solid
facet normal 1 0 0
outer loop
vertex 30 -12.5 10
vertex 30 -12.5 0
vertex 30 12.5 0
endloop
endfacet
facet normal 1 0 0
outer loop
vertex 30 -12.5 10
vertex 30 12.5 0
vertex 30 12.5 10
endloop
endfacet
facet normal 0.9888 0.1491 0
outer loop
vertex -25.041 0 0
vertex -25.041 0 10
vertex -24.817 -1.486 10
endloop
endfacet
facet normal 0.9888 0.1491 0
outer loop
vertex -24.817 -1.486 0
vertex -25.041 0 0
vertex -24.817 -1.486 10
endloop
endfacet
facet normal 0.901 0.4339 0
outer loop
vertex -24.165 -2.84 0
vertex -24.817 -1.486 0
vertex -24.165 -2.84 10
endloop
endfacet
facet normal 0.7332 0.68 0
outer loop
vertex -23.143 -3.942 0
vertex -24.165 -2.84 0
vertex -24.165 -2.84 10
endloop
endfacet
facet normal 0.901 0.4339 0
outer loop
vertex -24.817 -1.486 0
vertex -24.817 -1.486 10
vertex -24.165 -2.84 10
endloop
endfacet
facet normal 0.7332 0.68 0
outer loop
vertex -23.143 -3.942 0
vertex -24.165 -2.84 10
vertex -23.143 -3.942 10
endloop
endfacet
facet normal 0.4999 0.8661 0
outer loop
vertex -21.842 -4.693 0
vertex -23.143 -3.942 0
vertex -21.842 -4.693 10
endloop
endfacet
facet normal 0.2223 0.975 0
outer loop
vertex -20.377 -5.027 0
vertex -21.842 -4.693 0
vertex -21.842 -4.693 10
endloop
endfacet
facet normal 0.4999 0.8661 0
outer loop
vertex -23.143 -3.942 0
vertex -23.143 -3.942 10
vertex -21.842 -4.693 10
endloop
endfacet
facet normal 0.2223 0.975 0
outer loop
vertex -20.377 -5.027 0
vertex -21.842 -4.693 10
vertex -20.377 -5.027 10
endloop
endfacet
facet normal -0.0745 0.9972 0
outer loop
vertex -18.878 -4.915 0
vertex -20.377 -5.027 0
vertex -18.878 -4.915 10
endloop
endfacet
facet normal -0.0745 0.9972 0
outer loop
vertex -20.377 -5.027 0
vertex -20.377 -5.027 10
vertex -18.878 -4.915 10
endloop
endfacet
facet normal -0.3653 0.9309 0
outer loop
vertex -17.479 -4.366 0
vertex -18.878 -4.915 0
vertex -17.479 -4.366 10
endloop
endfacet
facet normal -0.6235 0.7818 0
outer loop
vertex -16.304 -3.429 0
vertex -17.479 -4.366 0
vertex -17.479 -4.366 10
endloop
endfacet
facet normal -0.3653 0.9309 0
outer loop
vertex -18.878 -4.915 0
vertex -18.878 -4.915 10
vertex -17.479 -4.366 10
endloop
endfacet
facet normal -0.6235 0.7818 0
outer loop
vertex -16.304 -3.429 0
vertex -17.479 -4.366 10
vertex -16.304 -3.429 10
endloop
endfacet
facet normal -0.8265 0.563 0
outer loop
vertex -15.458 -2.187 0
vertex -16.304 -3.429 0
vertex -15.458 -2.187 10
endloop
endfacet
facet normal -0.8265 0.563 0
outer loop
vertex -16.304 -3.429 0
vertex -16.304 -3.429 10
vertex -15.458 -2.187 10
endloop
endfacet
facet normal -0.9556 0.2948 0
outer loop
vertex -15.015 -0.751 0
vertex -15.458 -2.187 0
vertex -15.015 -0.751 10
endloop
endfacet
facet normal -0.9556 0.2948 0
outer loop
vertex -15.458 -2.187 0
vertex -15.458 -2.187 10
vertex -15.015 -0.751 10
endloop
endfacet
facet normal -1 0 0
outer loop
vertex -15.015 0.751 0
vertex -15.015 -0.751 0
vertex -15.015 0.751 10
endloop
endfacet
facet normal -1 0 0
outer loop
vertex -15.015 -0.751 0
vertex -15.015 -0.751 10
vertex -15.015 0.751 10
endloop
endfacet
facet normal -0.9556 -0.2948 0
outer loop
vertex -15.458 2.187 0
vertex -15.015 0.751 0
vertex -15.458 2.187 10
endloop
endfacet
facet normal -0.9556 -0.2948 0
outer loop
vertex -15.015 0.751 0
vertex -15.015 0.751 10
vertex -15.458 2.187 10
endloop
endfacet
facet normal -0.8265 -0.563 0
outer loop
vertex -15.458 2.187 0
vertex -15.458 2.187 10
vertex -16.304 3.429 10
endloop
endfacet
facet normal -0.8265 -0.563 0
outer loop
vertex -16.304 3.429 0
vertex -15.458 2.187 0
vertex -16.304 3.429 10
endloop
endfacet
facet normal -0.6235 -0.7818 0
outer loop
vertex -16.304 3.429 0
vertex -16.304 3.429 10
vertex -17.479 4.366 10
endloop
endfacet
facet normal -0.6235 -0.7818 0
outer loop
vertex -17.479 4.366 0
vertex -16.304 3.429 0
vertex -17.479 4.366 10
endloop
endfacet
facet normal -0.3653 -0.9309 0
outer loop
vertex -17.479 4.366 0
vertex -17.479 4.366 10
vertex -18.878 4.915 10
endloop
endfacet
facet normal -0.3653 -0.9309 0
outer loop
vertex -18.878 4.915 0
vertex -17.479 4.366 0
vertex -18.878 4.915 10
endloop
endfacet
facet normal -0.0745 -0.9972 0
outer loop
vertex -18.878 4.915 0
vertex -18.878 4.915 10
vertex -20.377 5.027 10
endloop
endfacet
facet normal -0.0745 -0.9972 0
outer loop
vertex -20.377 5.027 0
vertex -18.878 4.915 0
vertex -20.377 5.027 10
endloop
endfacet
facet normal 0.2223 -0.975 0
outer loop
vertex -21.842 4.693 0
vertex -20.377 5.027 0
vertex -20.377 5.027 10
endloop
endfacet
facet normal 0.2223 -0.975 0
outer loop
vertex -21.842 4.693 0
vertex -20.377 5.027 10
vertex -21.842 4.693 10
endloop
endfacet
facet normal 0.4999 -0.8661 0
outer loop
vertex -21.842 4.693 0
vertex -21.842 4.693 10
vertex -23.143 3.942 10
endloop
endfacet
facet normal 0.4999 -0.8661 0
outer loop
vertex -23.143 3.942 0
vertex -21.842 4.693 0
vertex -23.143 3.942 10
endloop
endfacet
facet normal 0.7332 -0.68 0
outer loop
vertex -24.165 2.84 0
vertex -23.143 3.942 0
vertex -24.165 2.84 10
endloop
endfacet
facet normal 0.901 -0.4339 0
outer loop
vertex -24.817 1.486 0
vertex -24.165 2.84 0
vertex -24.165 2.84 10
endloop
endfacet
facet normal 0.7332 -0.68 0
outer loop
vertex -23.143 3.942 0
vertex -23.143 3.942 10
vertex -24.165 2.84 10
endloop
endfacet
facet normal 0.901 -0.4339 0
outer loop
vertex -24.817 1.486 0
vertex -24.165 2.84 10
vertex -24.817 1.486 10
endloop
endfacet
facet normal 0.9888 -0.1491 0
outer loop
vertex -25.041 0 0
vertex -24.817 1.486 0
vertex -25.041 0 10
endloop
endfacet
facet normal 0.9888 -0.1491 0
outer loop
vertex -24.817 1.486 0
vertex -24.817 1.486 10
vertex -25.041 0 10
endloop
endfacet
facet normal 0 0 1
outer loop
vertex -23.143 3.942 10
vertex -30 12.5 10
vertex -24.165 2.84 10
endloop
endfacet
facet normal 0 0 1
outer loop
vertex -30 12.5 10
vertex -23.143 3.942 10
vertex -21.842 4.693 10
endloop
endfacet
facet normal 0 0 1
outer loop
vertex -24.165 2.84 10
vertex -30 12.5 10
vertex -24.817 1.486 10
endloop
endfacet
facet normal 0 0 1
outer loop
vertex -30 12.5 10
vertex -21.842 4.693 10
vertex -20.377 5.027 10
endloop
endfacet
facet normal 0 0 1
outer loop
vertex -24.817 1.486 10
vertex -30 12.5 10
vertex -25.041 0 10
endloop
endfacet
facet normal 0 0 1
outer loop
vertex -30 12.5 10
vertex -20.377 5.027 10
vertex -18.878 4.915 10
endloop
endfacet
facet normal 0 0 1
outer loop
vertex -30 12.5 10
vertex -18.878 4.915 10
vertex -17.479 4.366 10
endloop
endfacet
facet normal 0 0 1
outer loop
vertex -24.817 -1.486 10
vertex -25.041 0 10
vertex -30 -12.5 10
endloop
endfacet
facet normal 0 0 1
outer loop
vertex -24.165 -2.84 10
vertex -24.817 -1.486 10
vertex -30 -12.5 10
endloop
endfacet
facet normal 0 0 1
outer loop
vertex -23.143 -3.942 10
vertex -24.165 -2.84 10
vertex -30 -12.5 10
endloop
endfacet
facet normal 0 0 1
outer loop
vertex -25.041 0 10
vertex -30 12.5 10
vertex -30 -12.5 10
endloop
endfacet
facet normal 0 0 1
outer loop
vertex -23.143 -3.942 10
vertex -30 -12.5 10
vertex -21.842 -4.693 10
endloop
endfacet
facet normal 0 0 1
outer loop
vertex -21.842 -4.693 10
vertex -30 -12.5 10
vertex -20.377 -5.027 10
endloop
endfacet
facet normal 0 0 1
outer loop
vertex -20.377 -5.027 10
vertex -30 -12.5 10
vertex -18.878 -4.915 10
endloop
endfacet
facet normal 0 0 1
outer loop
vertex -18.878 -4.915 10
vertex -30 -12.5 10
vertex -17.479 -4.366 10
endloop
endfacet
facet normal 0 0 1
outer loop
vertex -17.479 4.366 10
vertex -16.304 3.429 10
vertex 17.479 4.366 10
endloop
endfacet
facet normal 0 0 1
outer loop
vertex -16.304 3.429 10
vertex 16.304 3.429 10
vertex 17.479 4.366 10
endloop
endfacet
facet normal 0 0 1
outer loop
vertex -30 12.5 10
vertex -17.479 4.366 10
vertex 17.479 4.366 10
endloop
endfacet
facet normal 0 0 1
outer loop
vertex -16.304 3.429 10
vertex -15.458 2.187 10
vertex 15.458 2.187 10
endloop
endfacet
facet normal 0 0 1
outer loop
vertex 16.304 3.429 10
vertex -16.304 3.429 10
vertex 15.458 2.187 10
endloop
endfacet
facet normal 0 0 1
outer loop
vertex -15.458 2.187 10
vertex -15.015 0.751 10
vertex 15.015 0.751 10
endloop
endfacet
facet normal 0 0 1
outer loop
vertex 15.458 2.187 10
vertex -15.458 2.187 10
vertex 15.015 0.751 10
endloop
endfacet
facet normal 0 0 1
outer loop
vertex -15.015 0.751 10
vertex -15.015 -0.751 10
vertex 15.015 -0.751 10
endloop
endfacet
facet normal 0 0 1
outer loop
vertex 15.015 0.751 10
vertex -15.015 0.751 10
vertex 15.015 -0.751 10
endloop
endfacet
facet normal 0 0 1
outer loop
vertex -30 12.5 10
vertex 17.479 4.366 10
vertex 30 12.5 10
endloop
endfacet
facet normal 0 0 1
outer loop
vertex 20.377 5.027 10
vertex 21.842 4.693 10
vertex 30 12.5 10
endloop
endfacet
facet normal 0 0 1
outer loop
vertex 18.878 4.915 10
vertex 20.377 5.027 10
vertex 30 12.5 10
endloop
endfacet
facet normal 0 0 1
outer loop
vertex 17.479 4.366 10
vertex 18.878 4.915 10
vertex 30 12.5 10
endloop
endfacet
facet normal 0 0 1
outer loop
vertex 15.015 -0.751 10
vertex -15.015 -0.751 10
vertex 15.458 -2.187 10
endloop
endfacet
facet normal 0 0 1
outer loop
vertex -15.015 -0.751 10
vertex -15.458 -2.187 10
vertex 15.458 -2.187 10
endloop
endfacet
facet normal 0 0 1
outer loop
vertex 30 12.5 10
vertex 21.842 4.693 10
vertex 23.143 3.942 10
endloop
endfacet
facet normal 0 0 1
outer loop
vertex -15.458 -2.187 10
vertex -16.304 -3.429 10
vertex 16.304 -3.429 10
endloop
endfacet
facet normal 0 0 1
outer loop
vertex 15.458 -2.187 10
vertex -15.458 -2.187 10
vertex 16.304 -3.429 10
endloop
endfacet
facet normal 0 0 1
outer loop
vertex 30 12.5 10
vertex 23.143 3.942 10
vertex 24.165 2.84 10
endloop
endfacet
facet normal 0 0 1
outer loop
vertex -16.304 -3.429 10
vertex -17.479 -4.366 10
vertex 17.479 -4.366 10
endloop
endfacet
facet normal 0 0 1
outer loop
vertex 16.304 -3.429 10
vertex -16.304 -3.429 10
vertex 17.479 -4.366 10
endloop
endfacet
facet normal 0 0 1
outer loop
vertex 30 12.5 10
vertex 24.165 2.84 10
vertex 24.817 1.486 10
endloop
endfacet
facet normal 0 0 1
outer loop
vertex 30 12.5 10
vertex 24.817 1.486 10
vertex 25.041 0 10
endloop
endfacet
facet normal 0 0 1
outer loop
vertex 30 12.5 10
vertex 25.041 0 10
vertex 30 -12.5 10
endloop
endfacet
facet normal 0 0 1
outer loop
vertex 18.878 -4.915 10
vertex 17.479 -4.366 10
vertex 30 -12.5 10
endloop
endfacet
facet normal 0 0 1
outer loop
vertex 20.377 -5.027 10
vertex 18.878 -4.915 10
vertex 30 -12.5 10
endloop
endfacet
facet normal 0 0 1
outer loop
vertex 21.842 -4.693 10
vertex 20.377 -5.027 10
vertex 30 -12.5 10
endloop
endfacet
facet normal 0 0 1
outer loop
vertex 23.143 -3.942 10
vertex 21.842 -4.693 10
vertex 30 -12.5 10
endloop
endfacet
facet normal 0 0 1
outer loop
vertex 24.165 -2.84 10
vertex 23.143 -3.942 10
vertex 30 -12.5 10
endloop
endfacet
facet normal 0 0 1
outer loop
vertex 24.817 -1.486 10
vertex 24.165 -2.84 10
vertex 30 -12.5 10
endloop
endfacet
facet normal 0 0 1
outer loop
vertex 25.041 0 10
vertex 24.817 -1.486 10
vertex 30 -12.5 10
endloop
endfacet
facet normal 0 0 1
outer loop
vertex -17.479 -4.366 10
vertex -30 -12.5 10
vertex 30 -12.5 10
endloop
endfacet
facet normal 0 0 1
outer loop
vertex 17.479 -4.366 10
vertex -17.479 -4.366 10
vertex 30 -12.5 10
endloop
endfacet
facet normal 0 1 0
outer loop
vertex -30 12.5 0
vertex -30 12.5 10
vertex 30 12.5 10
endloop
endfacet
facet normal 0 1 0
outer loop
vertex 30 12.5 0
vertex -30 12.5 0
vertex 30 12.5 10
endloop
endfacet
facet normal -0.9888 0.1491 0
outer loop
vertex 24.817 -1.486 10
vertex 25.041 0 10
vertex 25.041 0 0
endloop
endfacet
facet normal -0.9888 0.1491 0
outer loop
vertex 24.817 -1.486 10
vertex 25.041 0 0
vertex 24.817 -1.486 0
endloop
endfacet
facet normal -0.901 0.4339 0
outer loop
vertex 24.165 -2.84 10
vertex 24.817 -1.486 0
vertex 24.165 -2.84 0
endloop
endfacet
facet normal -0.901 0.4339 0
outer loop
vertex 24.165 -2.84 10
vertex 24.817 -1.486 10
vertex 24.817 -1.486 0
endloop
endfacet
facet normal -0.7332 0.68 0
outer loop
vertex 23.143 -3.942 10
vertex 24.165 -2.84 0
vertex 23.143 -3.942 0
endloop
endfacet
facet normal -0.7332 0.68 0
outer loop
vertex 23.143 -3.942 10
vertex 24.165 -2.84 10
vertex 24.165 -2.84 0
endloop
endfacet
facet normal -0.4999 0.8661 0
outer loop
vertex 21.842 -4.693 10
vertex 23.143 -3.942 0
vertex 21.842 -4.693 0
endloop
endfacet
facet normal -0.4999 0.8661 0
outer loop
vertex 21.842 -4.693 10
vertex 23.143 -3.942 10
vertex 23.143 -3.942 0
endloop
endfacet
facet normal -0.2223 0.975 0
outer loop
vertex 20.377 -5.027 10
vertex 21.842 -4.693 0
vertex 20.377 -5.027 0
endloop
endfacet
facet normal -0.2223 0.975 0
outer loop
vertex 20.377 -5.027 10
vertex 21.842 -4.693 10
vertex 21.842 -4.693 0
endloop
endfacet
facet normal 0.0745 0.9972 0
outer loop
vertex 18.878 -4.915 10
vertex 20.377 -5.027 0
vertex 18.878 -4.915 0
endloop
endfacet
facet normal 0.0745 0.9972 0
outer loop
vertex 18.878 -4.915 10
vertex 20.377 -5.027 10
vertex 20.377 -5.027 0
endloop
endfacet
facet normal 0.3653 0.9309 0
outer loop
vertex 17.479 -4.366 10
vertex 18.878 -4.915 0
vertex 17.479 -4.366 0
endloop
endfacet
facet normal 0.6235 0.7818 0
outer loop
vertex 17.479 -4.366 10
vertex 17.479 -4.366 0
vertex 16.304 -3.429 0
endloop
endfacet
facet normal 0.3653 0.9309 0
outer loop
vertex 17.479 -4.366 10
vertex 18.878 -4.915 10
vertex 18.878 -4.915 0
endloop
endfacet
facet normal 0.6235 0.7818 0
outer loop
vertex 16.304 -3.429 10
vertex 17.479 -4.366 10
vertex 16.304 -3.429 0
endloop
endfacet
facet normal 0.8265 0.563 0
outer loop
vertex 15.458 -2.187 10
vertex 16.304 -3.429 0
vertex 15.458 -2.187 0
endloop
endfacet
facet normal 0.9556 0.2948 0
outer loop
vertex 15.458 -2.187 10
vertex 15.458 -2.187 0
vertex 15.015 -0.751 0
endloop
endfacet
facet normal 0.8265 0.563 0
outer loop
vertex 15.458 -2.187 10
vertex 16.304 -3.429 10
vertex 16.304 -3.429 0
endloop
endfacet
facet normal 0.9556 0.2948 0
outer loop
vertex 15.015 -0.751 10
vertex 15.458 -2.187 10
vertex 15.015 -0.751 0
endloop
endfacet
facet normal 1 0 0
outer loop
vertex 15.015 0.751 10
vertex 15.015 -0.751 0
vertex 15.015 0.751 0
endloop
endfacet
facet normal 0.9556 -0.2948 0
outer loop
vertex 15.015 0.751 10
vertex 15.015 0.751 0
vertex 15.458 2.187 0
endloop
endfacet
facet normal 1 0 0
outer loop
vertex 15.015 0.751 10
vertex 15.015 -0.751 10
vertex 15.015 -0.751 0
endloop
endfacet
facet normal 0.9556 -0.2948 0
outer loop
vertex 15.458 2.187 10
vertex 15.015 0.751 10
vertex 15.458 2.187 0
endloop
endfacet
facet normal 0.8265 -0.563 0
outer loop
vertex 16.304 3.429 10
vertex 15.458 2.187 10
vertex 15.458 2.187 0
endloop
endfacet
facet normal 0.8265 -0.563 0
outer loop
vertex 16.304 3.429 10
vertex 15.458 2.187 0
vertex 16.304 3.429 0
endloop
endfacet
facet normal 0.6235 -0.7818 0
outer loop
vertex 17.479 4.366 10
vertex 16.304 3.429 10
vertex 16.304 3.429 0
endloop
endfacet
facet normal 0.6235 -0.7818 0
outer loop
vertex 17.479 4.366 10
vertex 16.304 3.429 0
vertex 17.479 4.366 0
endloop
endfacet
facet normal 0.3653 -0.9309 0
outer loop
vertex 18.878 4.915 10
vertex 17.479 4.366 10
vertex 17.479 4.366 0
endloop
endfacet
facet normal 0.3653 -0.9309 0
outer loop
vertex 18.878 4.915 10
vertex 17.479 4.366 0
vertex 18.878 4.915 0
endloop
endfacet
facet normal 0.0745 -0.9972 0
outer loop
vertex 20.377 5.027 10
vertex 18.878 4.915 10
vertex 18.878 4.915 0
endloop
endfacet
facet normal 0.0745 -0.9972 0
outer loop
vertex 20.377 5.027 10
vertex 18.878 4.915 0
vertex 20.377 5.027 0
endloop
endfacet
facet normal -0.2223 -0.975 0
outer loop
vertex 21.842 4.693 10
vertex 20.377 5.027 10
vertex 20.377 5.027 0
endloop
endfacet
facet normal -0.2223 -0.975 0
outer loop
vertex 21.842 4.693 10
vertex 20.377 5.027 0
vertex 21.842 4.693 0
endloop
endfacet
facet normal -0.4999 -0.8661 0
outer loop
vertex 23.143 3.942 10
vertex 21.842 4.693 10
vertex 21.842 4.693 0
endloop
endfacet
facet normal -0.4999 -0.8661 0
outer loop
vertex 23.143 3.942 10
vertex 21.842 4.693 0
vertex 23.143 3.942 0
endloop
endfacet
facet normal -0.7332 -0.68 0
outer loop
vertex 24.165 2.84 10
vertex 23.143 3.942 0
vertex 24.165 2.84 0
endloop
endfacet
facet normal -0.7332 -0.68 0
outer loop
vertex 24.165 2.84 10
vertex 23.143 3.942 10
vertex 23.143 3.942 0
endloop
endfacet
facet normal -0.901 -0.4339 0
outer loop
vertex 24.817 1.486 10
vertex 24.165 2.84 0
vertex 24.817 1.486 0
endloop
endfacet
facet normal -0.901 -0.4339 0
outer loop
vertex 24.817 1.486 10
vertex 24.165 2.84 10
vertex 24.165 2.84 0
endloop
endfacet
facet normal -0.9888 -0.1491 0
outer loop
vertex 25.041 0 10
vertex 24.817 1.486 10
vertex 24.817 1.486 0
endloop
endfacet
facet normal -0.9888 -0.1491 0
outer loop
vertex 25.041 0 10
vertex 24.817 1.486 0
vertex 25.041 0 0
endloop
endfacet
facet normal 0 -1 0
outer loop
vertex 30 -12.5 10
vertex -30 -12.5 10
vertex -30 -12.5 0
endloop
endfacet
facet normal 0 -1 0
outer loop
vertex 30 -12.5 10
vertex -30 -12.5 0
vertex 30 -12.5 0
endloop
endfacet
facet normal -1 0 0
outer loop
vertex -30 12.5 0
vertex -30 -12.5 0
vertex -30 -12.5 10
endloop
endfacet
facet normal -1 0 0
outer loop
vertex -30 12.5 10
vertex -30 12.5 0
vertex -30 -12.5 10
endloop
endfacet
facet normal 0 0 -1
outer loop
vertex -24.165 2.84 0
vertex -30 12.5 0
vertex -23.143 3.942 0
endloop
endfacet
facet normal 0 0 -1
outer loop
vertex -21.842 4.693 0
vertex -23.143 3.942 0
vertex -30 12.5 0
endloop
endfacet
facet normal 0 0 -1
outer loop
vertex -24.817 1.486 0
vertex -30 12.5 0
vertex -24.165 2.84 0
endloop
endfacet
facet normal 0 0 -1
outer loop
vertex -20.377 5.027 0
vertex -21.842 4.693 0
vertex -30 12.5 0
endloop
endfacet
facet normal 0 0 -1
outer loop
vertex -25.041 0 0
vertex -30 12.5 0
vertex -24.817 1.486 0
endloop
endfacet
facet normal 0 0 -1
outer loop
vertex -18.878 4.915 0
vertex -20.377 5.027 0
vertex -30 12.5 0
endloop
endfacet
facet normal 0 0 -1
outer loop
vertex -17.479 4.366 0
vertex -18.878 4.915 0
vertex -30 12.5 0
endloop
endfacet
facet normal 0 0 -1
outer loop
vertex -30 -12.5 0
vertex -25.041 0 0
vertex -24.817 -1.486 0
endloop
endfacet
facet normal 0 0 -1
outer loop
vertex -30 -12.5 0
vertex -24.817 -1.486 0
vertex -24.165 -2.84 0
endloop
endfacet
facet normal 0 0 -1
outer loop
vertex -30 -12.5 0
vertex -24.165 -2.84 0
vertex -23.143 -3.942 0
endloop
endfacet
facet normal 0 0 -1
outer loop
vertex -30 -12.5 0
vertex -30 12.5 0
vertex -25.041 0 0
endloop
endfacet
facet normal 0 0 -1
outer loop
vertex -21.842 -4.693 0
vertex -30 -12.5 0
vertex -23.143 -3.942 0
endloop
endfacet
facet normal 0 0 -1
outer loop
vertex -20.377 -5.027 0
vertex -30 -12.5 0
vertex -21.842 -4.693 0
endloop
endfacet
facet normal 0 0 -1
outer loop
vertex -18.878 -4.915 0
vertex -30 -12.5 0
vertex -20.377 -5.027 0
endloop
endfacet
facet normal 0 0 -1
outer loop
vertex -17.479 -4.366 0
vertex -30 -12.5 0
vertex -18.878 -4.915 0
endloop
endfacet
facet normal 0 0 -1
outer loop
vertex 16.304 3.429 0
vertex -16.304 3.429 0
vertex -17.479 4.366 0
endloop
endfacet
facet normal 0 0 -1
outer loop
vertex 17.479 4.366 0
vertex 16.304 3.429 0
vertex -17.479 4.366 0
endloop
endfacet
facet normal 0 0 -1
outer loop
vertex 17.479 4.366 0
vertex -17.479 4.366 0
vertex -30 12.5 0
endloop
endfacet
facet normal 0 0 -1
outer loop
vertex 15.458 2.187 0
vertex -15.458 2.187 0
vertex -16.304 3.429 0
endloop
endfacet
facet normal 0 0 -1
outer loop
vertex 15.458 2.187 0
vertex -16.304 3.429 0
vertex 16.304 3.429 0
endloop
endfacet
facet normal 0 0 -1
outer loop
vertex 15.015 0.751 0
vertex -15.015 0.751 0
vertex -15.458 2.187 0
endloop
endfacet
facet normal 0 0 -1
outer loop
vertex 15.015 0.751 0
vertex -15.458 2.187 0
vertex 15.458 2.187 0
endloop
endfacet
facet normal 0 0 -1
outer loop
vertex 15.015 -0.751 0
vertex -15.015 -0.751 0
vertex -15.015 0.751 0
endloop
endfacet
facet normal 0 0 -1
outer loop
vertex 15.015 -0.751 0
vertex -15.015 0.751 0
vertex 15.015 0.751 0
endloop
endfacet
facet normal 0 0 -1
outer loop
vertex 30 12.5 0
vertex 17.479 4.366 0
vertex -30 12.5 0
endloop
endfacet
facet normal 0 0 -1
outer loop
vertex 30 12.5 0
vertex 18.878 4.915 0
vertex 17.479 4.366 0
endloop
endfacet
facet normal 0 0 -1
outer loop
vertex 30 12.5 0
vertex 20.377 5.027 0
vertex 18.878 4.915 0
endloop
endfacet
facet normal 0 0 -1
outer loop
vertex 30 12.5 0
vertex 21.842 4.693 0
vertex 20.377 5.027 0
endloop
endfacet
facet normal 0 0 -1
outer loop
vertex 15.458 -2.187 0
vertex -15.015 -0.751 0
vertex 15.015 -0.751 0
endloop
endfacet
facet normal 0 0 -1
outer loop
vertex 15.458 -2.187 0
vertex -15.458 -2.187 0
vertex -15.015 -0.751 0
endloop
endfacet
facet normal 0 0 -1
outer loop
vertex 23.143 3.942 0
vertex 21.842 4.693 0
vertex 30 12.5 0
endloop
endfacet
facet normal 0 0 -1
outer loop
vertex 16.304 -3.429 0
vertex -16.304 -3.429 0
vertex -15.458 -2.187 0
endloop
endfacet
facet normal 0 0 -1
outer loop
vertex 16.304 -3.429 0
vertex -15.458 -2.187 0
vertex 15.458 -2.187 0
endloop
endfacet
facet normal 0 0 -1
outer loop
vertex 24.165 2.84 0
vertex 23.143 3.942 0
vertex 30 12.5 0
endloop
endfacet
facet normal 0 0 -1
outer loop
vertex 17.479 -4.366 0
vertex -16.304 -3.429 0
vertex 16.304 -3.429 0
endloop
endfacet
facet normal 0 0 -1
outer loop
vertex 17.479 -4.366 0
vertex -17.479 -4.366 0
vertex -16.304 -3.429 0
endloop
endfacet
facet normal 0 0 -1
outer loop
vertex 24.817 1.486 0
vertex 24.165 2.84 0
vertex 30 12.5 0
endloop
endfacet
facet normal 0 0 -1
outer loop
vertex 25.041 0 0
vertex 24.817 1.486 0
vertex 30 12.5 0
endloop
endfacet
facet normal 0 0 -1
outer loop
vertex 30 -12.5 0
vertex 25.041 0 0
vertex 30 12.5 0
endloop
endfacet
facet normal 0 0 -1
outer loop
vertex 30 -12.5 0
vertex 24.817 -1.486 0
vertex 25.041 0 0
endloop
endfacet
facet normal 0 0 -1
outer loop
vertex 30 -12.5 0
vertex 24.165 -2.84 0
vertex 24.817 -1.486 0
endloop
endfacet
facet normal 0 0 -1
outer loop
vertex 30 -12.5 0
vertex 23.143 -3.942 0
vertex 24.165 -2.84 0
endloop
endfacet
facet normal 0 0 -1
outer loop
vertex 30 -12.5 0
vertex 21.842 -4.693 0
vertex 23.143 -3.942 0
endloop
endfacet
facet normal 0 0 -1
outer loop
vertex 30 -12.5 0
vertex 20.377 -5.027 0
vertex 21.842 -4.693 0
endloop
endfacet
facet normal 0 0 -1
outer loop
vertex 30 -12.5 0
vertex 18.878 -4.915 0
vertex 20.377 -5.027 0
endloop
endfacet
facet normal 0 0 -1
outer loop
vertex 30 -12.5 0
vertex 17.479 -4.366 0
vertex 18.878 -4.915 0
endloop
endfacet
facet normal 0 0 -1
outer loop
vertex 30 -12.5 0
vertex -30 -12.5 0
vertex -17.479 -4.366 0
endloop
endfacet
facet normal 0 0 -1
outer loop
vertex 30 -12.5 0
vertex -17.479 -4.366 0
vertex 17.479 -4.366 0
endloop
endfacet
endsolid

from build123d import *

# Parameters (mm, degrees)
F0_W     = 60
F0_H     = 10
F1_DEPTH = 12.5
F2_W     = 5.0413812651
F2_H     = 12


# Not quite as in the source:
# - a pattern or mirror of a feature is missing from the dataset's text; its kind, count and spacing are read off the source's solid


with BuildPart() as f1:
    # F0 (on Front) → F1 (new body, symmetric)
    with BuildSketch(Plane.XZ):
        with Locations((0, 5)):
            Rectangle(F0_W, F0_H)
    extrude(amount=F1_DEPTH, both=True)

    # F2 (on Front) → F3 (revolve, cut)
    with BuildSketch(Plane.XZ):
        with Locations((-22.5206906326, 6)):
            Rectangle(F2_W, F2_H)
    f3 = revolve(axis=Axis((-20, 0, 6), (0, 0, 1)), mode=Mode.SUBTRACT)

    # F3_copies: F3 across plane
    add(f3.mirror(Plane(origin=(0, 0, 0), x_dir=(0, 0, 1), z_dir=(1, 0, 0))), mode=Mode.SUBTRACT)


solid = f1.part
